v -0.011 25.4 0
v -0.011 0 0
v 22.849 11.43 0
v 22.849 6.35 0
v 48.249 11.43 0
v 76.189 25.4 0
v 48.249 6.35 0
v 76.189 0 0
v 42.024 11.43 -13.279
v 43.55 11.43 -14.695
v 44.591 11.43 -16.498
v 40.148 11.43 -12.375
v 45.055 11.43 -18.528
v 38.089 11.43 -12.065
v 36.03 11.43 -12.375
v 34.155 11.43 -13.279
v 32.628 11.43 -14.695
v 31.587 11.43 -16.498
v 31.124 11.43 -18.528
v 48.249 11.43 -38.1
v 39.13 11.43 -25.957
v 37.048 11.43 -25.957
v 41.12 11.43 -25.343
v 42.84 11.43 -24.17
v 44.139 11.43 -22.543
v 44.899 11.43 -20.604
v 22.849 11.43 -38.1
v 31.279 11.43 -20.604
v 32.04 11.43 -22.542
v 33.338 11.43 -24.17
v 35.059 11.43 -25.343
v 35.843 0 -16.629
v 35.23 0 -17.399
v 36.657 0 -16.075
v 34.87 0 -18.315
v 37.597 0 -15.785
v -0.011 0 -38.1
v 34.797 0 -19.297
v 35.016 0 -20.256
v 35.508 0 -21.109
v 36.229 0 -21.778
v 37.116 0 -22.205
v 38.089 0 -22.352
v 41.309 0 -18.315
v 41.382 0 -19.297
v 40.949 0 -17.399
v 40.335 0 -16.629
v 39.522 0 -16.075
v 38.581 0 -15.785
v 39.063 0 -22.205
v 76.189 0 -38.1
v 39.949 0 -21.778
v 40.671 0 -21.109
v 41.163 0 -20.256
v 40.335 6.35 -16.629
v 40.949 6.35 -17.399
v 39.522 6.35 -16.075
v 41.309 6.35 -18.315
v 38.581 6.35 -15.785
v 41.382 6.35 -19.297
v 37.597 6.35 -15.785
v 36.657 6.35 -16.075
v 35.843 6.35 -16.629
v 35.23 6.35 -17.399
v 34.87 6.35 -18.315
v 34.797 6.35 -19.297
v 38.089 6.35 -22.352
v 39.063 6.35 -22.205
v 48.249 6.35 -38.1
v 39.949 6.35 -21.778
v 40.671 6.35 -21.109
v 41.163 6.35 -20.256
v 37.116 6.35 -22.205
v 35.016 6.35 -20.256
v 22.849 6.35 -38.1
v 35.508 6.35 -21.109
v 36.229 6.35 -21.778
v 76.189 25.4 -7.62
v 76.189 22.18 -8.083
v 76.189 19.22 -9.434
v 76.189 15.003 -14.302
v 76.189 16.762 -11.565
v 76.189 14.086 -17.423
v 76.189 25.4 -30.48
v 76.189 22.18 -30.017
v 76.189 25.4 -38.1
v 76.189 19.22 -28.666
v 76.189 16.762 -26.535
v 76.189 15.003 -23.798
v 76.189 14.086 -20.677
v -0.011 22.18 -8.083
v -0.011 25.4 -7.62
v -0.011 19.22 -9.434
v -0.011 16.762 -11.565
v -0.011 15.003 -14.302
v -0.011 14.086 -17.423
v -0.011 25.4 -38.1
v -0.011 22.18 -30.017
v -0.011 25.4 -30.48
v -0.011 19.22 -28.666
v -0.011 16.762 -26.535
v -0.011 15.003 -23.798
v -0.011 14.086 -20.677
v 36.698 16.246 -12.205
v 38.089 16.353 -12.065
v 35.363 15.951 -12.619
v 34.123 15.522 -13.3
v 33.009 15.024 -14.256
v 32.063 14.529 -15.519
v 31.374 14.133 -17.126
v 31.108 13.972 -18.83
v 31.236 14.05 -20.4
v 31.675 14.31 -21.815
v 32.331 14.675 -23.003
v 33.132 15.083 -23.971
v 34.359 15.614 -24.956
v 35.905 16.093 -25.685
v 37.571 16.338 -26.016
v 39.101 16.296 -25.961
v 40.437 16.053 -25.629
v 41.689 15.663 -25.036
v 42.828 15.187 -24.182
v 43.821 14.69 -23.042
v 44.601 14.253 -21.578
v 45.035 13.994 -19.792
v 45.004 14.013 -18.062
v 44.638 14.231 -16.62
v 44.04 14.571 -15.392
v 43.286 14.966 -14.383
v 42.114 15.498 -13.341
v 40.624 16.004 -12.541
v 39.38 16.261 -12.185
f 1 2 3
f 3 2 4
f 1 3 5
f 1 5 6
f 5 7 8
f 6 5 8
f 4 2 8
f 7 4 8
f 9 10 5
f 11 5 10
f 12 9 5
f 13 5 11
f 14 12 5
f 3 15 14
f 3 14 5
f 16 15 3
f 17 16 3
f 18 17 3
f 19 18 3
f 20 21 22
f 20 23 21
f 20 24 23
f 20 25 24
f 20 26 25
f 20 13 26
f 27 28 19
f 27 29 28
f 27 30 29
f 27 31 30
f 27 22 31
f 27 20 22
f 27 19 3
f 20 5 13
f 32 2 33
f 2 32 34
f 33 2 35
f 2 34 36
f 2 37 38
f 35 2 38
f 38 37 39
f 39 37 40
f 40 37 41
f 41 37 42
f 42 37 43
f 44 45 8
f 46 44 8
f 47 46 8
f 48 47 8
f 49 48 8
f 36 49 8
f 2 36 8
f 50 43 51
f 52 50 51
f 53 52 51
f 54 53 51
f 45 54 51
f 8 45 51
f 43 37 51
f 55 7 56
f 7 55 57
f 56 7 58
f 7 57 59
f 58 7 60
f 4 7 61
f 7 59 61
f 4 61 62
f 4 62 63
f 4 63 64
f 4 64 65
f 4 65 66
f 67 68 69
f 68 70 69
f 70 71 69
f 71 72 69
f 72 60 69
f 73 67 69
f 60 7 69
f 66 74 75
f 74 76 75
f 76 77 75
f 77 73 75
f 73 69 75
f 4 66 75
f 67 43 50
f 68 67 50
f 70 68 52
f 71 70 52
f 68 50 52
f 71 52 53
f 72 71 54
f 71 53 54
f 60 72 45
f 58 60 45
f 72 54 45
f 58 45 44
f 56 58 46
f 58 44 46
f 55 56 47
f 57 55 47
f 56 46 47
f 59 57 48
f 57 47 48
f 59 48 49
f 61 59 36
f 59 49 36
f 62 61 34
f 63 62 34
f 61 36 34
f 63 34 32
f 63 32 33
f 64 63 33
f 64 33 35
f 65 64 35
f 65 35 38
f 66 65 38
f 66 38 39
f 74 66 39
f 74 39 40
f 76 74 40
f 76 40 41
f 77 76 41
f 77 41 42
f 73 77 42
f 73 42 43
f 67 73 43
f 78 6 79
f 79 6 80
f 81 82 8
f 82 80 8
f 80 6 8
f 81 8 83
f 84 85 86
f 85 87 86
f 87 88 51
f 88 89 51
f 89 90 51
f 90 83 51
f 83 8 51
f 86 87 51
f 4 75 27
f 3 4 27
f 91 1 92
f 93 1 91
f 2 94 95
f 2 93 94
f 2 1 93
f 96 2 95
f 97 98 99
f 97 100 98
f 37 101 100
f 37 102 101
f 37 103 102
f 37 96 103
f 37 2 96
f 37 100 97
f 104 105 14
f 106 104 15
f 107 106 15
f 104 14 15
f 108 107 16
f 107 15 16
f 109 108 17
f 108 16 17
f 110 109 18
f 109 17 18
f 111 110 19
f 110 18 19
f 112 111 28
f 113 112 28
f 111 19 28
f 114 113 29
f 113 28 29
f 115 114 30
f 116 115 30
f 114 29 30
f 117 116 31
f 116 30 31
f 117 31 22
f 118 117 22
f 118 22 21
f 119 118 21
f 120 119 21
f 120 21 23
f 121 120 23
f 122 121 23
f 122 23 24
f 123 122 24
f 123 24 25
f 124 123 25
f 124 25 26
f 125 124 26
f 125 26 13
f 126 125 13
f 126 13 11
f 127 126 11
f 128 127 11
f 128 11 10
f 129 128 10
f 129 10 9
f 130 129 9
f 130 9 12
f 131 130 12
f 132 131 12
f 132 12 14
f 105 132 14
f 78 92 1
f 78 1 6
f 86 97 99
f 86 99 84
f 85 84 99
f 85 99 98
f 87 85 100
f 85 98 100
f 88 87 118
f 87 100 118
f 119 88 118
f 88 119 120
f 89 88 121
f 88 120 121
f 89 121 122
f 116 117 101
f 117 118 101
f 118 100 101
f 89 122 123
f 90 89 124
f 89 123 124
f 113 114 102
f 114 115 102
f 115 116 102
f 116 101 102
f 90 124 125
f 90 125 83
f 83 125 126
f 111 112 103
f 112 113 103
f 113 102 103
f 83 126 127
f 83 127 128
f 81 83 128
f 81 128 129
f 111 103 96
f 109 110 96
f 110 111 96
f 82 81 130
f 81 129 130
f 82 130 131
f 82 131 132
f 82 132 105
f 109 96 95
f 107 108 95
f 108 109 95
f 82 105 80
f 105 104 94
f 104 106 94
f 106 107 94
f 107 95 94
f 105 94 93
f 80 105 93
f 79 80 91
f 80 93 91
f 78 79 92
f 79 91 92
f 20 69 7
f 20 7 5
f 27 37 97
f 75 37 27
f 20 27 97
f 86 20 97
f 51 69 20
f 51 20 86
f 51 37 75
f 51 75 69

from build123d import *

# Parameters (mm, degrees)
SKETCH1_W           = 76.2
SKETCH1_H           = 38.1
BOSS_EXTRUDE1_DEPTH = 25.4
SKETCH2_R           = 11.43
CUT_EXTRUDE1_DEPTH  = 89.9
SKETCH5_W           = 25.4
SKETCH5_H           = 5.08
CUT_EXTRUDE3_DEPTH  = 89.890839867
SKETCH3_R           = 3.302
CUT_EXTRUDE6_DEPTH  = 89.890839867
CUT_EXTRUDE7_START  = -7.62
SKETCH3_3_R         = 6.985
SKETCH3_3_R_2       = 3.302
CUT_EXTRUDE7_DEPTH  = 10.16


with BuildPart() as part:
    # Sketch1 → Boss-Extrude1 (new body)
    with BuildSketch(Plane(origin=(0, 0, 0), x_dir=(1, 0, 0), z_dir=(0, 1, 0))):
        with Locations((38.089312979, 19.05)):
            Rectangle(SKETCH1_W, SKETCH1_H)
    extrude(amount=BOSS_EXTRUDE1_DEPTH)

    # Sketch2 → Cut-Extrude1 (cut, through all)
    with BuildSketch(Plane.ZY.offset(0.010687021)):
        with Locations((-19.05, 25.4)):
            Circle(SKETCH2_R)
    extrude(amount=-CUT_EXTRUDE1_DEPTH, mode=Mode.SUBTRACT)

    # Sketch5 → Cut-Extrude3 (cut, through all)
    with BuildSketch(Plane(origin=(0, 0, -38.1), x_dir=(-1, 0, 0), z_dir=(0, 0, -1))):
        with Locations((-35.549312979, 8.89)):
            Rectangle(SKETCH5_W, SKETCH5_H)
    extrude(amount=-CUT_EXTRUDE3_DEPTH, mode=Mode.SUBTRACT)

    # Sketch3 → Cut-Extrude6 (cut, through all)
    with BuildSketch(Plane.XZ):
        with Locations((38.089312979, -19.05)):
            Circle(SKETCH3_R)
    extrude(amount=-CUT_EXTRUDE6_DEPTH, mode=Mode.SUBTRACT)

    # Sketch3<3> → Cut-Extrude7 (cut)
    with BuildSketch(Plane.XZ.offset(CUT_EXTRUDE7_START)):
        with Locations((38.089312979, -19.05)):
            Circle(SKETCH3_3_R)
        with Locations((38.089312979, -19.05)):
            Circle(SKETCH3_3_R_2, mode=Mode.SUBTRACT)
    extrude(amount=-CUT_EXTRUDE7_DEPTH, mode=Mode.SUBTRACT)


solid = part.part
